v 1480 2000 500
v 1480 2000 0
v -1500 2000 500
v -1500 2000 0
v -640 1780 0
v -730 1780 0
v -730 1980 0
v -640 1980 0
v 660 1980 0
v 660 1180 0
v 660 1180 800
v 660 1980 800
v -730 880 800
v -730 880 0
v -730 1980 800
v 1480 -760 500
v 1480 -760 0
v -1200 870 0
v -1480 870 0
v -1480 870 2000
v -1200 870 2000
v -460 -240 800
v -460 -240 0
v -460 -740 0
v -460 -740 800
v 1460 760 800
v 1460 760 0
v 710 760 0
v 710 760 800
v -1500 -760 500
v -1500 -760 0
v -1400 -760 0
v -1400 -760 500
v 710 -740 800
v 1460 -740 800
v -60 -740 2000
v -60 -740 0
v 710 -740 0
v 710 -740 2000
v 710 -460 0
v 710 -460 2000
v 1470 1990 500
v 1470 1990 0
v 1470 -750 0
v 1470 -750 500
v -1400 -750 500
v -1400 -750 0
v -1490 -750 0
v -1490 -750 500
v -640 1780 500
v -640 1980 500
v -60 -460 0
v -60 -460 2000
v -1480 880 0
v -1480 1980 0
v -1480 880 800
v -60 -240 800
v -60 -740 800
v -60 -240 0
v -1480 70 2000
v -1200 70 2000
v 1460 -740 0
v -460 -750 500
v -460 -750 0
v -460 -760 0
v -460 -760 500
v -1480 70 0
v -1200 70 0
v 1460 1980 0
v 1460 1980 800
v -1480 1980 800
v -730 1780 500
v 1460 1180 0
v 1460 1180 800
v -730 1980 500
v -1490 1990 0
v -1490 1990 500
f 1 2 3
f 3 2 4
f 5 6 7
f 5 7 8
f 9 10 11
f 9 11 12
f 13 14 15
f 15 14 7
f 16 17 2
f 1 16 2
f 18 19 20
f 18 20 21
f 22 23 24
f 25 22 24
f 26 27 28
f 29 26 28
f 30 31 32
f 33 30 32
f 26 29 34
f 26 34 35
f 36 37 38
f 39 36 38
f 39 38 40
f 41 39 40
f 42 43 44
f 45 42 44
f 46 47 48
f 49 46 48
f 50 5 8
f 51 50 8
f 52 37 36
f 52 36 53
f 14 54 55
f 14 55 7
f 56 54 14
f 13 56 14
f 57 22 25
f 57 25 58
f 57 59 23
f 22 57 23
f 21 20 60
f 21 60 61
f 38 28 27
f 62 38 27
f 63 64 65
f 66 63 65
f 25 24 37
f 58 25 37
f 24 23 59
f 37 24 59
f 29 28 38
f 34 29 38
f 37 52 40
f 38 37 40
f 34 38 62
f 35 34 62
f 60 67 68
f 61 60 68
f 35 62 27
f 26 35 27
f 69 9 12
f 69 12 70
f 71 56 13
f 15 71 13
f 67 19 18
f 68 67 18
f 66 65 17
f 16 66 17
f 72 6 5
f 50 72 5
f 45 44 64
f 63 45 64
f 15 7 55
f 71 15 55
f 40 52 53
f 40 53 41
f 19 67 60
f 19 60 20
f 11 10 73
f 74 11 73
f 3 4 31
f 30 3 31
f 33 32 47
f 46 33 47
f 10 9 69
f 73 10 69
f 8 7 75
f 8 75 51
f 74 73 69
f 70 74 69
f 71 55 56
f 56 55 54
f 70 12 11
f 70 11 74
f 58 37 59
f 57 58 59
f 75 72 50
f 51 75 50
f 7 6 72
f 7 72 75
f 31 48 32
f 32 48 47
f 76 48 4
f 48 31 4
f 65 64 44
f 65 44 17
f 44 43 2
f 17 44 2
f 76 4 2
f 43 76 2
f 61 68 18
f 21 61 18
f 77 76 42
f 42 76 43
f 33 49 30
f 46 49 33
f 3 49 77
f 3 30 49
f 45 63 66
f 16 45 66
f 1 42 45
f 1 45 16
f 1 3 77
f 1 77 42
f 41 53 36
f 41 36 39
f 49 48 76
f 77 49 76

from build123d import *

# Parameters (mm, degrees)
F1_DEPTH = 500
F0_W     = 280
F0_H     = 800
F2_DEPTH = 2000
F0_W_2   = 90
F0_H_2   = 200
F3_DEPTH = 500
F0_W_3   = 670
F4_DEPTH = 800
F0_W_4   = 770
F0_H_3   = 280
F5_DEPTH = 2000
F6_DEPTH = 800
F0_W_5   = 800
F7_DEPTH = 800
F0_W_6   = 30
F8_DEPTH = 800


with BuildPart() as f1:
    # F0 (on Top) → F1 (new body)
    with BuildSketch(Plane.XY):
        Polygon((-1490, -750), (-1490, 1990), (1470, 1990), (1470, -750), (-460, -750), (-460, -760), (1480, -760), (1480, 2000), (-1500, 2000), (-1500, -760), (-1400, -760), (-1400, -750), align=None)
    extrude(amount=F1_DEPTH)


with BuildPart() as f2:
    # F0 (on Top) → F2 (new body)
    with BuildSketch(Plane.XY):
        with Locations((-1340, 470)):
            Rectangle(F0_W, F0_H)
    extrude(amount=F2_DEPTH)


with BuildPart() as f3:
    # F0 (on Top) → F3 (new body)
    with BuildSketch(Plane.XY):
        with Locations((-685, 1880)):
            Rectangle(F0_W_2, F0_H_2)
    extrude(amount=F3_DEPTH)


with BuildPart() as f4:
    # F0 (on Top) → F4 (new body)
    with BuildSketch(Plane.XY):
        with Locations((-1065, 1880)):
            Rectangle(F0_W_3, F0_H_2)
        Polygon((-1400, 1780), (-1400, 1980), (-1480, 1980), (-1480, 880), (-730, 880), (-730, 1780), align=None)
    extrude(amount=F4_DEPTH)


with BuildPart() as f5:
    # F0 (on Top) → F5 (new body)
    with BuildSketch(Plane.XY):
        with Locations((325, -600)):
            Rectangle(F0_W_4, F0_H_3)
    extrude(amount=F5_DEPTH)


with BuildPart() as f6:
    # F0 (on Top) → F6 (new body)
    with BuildSketch(Plane.XY):
        Polygon((1460, 760), (710, 760), (710, -460), (710, -740), (1460, -740), align=None)
    extrude(amount=F6_DEPTH)


with BuildPart() as f7:
    # F0 (on Top) → F7 (new body)
    with BuildSketch(Plane.XY):
        with Locations((1060, 1580)):
            Rectangle(F0_W_5, F0_H)
    extrude(amount=F7_DEPTH)


with BuildPart() as f8:
    # F0 (on Top) → F8 (new body)
    with BuildSketch(Plane.XY):
        Polygon((-90, -460), (-60, -460), (-60, -240), (-460, -240), (-460, -740), (-90, -740), align=None)
        with Locations((-75, -600)):
            Rectangle(F0_W_6, F0_H_3)
    extrude(amount=F8_DEPTH)


solid = Compound([f1.part, f2.part, f3.part, f4.part, f5.part, f6.part, f7.part, f8.part])
